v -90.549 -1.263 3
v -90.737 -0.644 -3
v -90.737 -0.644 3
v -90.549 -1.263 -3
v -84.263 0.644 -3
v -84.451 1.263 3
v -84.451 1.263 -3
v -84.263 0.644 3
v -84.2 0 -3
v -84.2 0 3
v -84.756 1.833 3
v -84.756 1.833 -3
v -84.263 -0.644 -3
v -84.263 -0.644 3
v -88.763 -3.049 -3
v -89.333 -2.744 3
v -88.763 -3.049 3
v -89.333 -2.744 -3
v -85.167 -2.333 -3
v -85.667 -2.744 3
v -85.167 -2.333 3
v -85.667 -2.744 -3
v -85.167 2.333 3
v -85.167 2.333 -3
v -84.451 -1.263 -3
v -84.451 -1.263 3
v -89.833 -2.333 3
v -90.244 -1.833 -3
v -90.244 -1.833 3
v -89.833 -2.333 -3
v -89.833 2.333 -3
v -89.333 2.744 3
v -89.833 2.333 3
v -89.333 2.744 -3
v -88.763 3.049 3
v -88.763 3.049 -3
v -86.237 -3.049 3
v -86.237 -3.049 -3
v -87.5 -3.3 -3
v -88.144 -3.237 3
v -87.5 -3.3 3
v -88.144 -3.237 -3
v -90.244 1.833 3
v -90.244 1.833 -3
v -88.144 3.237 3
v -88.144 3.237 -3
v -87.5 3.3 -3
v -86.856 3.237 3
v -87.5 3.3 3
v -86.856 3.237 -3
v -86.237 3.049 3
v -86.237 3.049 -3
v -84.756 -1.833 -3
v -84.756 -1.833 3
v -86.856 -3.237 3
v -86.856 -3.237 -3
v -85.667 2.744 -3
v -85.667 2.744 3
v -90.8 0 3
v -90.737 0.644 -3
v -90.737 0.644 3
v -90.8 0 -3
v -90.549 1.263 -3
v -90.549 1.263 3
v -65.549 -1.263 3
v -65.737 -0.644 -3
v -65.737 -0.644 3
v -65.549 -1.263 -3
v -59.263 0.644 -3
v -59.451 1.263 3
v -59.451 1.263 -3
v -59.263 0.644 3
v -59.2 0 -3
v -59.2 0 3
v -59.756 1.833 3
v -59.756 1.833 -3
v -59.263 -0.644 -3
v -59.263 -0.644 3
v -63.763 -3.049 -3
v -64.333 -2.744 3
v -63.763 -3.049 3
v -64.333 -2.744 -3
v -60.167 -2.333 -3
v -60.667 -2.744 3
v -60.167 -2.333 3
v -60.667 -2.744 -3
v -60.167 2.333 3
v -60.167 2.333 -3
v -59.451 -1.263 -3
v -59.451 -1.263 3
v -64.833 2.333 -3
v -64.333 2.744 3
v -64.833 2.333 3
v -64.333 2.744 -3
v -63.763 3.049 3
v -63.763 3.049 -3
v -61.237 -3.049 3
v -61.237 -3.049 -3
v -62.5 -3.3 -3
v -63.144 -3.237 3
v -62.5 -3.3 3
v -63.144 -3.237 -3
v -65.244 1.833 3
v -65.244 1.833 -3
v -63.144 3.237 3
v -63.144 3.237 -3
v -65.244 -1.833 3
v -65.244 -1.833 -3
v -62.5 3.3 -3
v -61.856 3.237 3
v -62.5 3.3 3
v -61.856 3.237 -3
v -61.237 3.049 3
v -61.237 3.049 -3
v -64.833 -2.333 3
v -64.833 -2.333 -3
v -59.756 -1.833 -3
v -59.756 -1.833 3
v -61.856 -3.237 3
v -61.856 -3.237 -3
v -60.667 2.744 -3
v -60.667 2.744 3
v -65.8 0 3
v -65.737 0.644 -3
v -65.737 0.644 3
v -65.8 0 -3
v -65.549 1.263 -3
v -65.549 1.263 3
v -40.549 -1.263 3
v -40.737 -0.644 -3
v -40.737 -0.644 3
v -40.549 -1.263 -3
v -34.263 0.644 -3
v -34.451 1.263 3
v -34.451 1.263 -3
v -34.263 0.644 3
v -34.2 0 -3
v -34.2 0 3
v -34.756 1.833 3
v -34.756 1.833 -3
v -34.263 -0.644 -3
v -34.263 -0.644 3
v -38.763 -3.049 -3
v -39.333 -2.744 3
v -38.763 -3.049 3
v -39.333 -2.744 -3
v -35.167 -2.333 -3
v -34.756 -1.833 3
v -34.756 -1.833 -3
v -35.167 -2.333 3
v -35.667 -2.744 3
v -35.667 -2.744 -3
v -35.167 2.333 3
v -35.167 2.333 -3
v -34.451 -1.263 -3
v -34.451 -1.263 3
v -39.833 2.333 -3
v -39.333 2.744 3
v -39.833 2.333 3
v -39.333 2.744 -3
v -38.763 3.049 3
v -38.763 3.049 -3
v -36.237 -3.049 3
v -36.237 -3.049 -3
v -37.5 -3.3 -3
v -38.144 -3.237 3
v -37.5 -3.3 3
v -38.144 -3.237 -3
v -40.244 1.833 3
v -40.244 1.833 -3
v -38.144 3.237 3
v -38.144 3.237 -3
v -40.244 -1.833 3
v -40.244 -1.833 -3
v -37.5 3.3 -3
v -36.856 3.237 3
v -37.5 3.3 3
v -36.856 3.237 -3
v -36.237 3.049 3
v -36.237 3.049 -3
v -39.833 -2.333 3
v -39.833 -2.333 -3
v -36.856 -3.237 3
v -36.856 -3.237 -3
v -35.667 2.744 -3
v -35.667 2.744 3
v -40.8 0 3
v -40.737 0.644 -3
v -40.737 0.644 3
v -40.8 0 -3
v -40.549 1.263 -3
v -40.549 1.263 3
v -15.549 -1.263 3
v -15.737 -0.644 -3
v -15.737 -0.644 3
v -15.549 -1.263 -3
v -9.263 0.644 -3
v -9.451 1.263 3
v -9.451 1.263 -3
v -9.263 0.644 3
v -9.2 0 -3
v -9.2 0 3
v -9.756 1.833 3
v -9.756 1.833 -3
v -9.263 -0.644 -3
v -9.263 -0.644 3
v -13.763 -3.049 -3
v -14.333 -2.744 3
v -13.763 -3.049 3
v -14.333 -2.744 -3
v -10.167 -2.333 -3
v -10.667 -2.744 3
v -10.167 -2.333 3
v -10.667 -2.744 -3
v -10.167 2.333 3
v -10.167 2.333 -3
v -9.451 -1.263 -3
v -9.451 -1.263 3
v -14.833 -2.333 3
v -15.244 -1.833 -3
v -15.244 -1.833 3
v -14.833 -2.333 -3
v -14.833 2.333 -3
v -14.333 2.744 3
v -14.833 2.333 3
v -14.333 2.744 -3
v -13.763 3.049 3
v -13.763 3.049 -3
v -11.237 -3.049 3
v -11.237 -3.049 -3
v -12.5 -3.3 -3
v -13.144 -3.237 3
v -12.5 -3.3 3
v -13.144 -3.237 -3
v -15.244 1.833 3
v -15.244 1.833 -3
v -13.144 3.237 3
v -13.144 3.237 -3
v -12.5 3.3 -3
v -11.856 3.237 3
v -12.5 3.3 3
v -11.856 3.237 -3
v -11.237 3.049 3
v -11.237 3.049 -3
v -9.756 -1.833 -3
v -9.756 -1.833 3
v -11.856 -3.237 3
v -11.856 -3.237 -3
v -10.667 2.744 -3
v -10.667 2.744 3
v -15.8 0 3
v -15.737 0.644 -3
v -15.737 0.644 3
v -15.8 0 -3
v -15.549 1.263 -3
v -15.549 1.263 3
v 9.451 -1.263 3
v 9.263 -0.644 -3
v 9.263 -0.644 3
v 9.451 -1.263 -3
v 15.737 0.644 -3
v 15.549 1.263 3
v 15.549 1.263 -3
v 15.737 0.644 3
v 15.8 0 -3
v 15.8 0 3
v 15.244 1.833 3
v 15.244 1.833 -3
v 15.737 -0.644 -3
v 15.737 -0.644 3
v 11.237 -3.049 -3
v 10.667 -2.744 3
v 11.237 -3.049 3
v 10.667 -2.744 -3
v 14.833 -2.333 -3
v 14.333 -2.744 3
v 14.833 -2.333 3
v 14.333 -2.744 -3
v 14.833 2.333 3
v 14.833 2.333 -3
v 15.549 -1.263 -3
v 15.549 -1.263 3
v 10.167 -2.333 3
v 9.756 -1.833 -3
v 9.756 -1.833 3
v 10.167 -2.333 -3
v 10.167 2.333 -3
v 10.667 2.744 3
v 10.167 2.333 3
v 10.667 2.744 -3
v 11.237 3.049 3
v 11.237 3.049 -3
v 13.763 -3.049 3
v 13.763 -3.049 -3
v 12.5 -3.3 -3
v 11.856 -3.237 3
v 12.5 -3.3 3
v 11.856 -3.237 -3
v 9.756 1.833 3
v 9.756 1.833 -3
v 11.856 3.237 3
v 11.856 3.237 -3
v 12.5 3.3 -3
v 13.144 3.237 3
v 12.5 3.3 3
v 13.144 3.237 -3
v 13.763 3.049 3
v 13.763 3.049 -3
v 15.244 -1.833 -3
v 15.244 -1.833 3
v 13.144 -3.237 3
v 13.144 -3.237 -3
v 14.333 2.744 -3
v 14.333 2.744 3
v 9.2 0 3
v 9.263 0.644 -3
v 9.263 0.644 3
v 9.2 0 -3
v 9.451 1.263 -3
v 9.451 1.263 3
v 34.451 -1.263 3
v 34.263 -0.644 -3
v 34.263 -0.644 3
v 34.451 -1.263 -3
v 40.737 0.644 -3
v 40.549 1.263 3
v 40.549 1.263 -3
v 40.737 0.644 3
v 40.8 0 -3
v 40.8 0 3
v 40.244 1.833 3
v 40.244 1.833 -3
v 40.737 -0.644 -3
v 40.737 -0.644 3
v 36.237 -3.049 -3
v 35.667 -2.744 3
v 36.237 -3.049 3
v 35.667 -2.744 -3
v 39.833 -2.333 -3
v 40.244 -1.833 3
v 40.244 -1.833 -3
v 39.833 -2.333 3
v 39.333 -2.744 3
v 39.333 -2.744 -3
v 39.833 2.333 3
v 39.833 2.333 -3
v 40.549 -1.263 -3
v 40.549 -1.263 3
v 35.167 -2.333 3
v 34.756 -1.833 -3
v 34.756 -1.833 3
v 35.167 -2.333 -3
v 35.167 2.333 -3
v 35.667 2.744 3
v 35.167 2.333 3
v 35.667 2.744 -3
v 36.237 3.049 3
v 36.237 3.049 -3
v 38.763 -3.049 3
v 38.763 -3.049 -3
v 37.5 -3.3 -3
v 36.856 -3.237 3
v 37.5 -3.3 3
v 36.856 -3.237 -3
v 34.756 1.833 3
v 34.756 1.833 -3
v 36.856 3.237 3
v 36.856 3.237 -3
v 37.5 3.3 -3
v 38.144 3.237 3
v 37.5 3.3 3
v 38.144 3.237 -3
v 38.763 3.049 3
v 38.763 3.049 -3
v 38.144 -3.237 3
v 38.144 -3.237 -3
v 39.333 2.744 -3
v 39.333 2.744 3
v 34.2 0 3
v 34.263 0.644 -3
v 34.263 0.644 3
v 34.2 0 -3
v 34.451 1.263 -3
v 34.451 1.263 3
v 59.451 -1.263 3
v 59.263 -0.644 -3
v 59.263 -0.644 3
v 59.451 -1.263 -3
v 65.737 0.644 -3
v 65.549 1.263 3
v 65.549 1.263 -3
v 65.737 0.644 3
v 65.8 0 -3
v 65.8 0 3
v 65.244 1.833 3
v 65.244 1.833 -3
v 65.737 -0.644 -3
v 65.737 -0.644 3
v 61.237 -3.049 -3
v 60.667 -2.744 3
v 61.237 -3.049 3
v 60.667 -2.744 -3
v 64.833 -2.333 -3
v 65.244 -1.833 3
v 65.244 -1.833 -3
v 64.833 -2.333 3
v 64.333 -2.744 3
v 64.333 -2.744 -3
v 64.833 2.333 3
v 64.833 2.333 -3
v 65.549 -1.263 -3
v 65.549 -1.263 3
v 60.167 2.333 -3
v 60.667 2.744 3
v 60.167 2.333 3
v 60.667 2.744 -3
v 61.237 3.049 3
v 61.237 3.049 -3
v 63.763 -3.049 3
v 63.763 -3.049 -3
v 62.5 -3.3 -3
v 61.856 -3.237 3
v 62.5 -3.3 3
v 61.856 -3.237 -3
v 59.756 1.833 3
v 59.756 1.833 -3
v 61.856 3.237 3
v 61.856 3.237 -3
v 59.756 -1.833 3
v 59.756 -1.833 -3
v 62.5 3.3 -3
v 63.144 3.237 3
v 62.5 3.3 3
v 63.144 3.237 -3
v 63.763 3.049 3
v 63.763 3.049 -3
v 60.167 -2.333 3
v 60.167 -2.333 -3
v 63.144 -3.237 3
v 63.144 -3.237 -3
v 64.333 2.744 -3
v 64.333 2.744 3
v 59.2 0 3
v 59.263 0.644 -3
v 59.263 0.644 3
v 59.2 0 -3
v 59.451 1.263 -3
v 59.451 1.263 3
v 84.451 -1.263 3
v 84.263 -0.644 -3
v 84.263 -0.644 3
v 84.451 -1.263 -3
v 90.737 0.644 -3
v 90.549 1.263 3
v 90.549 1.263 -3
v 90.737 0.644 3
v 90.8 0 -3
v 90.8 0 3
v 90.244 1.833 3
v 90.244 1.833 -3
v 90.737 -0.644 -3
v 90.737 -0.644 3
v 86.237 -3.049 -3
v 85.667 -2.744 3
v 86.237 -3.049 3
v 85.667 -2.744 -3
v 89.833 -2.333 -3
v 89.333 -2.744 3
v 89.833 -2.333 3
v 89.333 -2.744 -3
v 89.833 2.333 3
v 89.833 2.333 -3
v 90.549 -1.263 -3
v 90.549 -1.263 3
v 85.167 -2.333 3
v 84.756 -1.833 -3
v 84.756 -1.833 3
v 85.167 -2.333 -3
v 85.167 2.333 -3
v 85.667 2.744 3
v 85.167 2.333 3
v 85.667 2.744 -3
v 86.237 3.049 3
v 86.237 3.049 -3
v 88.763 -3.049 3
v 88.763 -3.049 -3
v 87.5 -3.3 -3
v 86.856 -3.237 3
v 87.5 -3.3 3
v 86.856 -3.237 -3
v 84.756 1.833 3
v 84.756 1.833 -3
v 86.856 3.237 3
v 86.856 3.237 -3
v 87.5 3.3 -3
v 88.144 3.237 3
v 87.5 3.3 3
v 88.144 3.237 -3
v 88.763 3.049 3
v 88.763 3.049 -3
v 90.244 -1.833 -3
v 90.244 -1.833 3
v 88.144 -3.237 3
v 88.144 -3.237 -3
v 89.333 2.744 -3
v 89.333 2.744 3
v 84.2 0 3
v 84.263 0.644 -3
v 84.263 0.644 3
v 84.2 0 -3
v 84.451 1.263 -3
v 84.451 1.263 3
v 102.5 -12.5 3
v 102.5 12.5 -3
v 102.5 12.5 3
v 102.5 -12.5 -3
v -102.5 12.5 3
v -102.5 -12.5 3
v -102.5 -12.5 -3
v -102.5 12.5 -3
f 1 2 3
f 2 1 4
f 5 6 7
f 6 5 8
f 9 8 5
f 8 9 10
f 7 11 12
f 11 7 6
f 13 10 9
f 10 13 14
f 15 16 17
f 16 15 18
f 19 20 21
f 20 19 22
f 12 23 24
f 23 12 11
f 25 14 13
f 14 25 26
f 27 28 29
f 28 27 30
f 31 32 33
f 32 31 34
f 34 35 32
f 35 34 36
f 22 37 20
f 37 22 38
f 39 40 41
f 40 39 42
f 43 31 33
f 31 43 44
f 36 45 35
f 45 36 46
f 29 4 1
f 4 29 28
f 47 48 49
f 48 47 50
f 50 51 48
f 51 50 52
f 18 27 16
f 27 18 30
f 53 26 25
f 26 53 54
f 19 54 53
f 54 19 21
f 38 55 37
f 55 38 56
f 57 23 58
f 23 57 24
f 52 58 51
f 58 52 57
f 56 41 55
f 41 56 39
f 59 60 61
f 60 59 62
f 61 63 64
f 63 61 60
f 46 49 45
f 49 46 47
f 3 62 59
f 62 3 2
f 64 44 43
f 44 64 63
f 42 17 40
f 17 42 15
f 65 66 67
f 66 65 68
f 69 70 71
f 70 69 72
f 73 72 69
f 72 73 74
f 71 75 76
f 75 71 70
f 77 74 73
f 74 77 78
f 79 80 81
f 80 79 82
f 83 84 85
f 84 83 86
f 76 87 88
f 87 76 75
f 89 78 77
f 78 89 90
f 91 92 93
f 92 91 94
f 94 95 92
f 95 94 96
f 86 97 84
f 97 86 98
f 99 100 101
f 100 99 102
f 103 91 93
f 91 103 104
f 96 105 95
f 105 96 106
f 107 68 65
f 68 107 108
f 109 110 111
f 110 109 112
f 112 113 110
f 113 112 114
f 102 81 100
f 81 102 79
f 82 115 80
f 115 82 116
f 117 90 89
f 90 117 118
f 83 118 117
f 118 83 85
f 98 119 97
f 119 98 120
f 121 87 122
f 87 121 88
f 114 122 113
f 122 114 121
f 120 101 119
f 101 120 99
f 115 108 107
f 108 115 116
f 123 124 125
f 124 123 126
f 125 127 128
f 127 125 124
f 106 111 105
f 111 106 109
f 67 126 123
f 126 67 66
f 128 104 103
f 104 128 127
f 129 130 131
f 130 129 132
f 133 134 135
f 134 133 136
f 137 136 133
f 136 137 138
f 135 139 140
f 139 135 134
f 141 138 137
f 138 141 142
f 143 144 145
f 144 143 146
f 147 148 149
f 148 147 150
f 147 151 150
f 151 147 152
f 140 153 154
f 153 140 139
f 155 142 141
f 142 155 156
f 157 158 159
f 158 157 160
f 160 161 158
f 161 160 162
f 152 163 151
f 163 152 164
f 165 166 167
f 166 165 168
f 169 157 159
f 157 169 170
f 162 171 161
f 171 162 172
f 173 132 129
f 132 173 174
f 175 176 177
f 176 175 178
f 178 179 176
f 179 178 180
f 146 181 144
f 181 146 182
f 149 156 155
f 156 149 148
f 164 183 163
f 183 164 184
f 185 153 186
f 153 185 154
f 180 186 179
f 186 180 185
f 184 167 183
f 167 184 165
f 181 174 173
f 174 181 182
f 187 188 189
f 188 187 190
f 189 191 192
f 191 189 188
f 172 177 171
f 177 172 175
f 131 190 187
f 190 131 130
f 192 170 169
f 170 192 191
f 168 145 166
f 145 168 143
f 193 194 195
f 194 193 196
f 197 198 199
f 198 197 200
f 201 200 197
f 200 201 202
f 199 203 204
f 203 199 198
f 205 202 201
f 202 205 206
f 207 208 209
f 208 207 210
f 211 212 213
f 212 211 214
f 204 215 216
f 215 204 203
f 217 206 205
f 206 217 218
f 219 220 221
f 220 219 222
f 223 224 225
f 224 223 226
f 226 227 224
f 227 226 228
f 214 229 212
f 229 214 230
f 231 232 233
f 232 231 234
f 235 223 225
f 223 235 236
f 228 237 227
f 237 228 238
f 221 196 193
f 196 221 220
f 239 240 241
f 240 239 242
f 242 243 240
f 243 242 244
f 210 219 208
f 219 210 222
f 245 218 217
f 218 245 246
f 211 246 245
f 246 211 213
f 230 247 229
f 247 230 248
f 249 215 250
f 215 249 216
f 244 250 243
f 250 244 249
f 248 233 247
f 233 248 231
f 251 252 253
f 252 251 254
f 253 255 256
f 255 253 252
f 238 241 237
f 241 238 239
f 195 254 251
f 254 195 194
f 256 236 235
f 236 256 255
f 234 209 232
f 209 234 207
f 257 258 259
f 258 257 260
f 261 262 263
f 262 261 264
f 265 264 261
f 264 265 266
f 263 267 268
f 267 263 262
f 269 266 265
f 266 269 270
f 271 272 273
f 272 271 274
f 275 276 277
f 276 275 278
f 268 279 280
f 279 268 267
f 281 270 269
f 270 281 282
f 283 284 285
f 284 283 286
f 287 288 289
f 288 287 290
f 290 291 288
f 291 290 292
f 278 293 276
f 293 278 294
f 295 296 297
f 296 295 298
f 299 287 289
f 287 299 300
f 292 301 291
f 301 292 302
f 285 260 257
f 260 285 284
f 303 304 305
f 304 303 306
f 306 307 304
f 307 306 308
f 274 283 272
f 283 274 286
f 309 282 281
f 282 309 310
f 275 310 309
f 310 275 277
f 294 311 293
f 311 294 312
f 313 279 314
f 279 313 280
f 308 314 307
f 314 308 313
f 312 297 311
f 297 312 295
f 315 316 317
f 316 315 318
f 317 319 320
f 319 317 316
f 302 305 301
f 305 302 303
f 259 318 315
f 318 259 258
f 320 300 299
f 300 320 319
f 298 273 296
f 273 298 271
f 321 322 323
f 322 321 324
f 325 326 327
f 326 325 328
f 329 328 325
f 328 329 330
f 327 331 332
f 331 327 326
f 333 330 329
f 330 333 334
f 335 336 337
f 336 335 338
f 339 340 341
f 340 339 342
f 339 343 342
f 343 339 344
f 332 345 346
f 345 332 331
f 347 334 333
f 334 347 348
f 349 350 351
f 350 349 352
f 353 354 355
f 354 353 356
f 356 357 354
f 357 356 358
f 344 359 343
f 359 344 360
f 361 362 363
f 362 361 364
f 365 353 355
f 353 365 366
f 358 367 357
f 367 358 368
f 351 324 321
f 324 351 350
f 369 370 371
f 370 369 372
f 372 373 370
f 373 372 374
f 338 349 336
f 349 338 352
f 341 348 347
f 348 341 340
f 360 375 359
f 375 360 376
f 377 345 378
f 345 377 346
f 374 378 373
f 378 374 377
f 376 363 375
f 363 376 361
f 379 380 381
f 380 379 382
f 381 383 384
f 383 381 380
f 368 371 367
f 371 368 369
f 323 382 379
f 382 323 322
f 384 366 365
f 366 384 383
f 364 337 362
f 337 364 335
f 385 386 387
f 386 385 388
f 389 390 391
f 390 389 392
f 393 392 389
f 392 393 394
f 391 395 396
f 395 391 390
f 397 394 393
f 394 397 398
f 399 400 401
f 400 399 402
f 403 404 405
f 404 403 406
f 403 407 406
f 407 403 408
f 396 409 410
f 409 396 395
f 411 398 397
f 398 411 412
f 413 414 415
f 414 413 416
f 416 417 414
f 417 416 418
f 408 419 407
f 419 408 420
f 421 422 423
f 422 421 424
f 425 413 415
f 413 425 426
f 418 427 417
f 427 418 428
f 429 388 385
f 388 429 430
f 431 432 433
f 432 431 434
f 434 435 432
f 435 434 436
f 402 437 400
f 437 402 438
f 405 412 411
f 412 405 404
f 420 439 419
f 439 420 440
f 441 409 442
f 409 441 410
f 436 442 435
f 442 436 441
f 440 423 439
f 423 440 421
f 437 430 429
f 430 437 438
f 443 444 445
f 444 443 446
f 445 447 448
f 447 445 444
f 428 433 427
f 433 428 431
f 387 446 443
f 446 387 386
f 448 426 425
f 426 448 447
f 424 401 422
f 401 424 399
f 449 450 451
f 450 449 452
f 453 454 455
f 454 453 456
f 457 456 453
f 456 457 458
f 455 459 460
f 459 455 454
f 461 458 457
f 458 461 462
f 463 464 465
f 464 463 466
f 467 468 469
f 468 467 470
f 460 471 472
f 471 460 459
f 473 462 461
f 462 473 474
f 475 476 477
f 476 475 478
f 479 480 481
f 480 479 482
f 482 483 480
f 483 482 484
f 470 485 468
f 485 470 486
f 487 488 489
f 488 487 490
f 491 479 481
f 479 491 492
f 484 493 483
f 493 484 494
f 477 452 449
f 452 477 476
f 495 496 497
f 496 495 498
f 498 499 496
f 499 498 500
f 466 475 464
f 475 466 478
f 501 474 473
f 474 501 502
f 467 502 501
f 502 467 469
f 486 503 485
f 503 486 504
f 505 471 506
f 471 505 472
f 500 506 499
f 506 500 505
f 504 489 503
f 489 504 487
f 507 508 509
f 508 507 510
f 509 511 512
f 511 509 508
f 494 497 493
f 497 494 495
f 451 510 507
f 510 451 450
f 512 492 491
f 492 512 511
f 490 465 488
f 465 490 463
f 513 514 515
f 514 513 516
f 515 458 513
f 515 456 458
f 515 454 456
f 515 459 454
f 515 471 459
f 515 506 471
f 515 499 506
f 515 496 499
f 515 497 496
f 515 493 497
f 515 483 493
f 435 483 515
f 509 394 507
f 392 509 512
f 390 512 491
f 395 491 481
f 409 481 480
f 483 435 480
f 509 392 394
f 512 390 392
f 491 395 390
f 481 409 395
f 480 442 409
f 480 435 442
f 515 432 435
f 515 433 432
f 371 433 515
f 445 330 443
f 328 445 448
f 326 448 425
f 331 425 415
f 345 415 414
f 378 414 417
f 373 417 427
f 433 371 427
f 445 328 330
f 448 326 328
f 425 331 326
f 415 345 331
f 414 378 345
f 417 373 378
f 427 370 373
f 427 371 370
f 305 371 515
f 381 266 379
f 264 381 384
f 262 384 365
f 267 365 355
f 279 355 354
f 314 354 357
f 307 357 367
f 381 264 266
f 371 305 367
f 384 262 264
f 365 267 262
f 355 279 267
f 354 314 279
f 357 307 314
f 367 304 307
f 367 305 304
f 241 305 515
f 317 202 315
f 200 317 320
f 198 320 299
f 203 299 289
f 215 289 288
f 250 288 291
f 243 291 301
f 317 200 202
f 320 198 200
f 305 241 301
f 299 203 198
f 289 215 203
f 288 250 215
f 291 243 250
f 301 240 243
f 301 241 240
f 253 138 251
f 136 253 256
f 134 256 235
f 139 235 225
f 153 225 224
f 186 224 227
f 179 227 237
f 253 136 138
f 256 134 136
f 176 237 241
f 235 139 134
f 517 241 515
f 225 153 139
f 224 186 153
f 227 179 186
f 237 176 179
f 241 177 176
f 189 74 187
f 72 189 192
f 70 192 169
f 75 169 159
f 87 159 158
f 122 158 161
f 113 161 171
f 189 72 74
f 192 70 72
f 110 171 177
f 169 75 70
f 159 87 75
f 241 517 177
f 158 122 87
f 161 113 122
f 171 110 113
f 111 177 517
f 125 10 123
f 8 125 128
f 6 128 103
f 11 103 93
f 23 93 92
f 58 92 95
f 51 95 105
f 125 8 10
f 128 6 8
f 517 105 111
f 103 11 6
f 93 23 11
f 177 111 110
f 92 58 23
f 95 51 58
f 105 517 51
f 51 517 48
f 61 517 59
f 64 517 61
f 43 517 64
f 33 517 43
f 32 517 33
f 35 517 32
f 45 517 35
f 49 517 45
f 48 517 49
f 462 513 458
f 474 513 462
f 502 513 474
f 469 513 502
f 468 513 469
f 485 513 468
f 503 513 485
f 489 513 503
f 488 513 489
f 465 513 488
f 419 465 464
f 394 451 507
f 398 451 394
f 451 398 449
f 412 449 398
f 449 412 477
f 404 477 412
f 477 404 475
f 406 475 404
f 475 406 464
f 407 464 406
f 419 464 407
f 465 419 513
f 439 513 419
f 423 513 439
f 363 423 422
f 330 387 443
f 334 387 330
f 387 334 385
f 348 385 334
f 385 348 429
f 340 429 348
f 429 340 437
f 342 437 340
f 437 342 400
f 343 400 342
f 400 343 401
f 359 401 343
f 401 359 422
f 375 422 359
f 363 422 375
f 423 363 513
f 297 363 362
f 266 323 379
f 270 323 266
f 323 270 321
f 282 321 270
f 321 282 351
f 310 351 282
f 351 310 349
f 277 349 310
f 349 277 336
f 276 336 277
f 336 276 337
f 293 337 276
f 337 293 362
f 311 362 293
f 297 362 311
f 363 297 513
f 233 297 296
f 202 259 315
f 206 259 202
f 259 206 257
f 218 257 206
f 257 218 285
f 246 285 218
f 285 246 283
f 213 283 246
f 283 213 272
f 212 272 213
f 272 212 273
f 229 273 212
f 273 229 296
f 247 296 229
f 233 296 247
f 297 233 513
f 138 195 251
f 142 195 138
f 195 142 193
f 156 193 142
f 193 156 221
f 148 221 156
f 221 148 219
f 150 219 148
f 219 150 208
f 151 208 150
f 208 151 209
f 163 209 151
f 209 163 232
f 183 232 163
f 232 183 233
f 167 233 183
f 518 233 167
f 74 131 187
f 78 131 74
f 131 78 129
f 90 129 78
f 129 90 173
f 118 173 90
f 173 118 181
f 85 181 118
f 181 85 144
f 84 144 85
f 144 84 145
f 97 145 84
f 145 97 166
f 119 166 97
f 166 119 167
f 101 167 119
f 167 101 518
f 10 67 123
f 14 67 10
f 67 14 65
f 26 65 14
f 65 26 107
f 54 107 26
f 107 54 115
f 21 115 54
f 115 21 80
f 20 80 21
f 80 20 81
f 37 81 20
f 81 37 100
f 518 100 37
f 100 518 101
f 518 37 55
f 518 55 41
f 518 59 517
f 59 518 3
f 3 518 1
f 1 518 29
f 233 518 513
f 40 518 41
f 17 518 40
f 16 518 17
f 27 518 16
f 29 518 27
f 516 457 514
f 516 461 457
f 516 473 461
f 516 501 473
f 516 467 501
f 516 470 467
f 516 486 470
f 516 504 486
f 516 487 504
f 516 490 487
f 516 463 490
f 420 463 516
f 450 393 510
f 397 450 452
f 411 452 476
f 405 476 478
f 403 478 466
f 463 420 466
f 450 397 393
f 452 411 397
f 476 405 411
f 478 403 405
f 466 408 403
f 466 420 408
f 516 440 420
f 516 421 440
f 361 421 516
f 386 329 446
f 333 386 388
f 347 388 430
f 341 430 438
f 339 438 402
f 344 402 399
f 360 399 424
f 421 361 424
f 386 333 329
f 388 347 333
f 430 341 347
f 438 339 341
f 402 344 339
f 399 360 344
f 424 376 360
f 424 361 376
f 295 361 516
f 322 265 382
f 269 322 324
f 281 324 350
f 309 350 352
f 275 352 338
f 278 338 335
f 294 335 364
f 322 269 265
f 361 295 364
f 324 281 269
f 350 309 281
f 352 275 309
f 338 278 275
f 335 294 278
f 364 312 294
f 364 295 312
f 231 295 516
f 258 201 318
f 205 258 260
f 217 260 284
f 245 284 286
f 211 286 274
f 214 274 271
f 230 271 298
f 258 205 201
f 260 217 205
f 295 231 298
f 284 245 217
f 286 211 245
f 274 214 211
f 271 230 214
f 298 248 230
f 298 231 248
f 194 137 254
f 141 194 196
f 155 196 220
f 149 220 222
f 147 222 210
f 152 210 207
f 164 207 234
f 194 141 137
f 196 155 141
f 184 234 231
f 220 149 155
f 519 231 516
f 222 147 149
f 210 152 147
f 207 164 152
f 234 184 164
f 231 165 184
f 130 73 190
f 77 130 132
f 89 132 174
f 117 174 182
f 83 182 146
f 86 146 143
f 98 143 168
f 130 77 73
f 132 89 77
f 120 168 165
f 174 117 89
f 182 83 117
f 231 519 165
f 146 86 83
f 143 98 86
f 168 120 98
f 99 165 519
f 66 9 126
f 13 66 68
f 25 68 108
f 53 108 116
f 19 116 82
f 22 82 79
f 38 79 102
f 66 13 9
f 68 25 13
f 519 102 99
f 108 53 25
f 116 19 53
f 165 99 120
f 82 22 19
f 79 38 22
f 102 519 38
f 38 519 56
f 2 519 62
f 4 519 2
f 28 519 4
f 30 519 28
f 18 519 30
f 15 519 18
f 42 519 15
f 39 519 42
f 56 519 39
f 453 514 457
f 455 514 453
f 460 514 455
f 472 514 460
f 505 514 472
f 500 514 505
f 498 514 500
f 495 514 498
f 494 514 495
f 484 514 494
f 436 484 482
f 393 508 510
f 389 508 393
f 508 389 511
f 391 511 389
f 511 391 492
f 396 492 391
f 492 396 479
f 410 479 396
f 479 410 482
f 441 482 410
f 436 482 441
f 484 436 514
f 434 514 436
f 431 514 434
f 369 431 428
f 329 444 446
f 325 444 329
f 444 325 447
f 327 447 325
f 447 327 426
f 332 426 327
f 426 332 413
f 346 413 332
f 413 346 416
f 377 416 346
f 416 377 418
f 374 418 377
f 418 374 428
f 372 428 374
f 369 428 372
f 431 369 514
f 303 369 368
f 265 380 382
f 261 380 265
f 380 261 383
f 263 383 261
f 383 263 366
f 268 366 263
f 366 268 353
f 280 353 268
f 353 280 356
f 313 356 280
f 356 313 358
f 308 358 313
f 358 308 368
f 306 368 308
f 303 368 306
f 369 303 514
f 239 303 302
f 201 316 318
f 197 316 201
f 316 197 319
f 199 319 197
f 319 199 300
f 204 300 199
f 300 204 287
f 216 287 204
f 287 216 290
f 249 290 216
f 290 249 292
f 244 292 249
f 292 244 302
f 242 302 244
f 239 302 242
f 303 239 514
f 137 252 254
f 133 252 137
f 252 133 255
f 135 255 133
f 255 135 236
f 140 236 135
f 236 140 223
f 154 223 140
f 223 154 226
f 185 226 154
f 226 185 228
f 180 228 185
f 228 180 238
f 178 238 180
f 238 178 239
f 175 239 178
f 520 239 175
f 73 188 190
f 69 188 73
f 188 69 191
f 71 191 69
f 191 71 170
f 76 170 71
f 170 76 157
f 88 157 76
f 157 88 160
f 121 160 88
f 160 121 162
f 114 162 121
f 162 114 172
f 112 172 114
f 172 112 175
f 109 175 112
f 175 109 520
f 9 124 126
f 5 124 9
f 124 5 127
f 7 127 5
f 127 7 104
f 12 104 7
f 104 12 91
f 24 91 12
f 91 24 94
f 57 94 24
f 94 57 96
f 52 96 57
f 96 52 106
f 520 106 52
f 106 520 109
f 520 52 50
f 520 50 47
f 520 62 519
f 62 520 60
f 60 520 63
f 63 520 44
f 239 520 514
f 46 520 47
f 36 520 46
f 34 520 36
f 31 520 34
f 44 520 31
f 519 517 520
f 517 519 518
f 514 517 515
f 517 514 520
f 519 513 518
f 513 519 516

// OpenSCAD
$fn = 32;

// ----------------------------------------------------------------------
// Hole bar, 8 x Ø6.6
// skip layout, 15 mm edge offset
// ----------------------------------------------------------------------

// --- parameters (mm) ---
bar_w = 25;         // bar width (Y)
bar_t = 6;          // bar thickness (Z)
holes = 8;          // holes per row
hole_d = 6.6;       // hole diameter
edge = 15;          // offset from the bar end to the first hole
grid_pitch = 12.5;  // grid the bar was laid out on

// --- derived feature positions (mm) ---
pitch = grid_pitch * 2;       // = 25   holes sit every other grid slot
span = (holes - 1) * pitch;   // = 175   distance between the end holes
bar_l = span + 2 * edge;      // = 205   overall bar length
start_x = -bar_l / 2 + edge;  // = -87.5   X of the first hole
feature_centers = [
  [start_x + 0 * pitch, 0],
  [start_x + 1 * pitch, 0],
  [start_x + 2 * pitch, 0],
  [start_x + 3 * pitch, 0],
  [start_x + 4 * pitch, 0],
  [start_x + 5 * pitch, 0],
  [start_x + 6 * pitch, 0],
  [start_x + 7 * pitch, 0]
];   // hole centres of the first row

// bar with one row of holes, drilled from feature_centers
difference() {
  translate([-bar_l / 2, -bar_w / 2, -bar_t / 2]) cube([bar_l, bar_w, bar_t]);
  for (centre = feature_centers)
    translate([centre[0], centre[1], 0])
      cylinder(d = hole_d, h = bar_t + 2, center = true);
}
